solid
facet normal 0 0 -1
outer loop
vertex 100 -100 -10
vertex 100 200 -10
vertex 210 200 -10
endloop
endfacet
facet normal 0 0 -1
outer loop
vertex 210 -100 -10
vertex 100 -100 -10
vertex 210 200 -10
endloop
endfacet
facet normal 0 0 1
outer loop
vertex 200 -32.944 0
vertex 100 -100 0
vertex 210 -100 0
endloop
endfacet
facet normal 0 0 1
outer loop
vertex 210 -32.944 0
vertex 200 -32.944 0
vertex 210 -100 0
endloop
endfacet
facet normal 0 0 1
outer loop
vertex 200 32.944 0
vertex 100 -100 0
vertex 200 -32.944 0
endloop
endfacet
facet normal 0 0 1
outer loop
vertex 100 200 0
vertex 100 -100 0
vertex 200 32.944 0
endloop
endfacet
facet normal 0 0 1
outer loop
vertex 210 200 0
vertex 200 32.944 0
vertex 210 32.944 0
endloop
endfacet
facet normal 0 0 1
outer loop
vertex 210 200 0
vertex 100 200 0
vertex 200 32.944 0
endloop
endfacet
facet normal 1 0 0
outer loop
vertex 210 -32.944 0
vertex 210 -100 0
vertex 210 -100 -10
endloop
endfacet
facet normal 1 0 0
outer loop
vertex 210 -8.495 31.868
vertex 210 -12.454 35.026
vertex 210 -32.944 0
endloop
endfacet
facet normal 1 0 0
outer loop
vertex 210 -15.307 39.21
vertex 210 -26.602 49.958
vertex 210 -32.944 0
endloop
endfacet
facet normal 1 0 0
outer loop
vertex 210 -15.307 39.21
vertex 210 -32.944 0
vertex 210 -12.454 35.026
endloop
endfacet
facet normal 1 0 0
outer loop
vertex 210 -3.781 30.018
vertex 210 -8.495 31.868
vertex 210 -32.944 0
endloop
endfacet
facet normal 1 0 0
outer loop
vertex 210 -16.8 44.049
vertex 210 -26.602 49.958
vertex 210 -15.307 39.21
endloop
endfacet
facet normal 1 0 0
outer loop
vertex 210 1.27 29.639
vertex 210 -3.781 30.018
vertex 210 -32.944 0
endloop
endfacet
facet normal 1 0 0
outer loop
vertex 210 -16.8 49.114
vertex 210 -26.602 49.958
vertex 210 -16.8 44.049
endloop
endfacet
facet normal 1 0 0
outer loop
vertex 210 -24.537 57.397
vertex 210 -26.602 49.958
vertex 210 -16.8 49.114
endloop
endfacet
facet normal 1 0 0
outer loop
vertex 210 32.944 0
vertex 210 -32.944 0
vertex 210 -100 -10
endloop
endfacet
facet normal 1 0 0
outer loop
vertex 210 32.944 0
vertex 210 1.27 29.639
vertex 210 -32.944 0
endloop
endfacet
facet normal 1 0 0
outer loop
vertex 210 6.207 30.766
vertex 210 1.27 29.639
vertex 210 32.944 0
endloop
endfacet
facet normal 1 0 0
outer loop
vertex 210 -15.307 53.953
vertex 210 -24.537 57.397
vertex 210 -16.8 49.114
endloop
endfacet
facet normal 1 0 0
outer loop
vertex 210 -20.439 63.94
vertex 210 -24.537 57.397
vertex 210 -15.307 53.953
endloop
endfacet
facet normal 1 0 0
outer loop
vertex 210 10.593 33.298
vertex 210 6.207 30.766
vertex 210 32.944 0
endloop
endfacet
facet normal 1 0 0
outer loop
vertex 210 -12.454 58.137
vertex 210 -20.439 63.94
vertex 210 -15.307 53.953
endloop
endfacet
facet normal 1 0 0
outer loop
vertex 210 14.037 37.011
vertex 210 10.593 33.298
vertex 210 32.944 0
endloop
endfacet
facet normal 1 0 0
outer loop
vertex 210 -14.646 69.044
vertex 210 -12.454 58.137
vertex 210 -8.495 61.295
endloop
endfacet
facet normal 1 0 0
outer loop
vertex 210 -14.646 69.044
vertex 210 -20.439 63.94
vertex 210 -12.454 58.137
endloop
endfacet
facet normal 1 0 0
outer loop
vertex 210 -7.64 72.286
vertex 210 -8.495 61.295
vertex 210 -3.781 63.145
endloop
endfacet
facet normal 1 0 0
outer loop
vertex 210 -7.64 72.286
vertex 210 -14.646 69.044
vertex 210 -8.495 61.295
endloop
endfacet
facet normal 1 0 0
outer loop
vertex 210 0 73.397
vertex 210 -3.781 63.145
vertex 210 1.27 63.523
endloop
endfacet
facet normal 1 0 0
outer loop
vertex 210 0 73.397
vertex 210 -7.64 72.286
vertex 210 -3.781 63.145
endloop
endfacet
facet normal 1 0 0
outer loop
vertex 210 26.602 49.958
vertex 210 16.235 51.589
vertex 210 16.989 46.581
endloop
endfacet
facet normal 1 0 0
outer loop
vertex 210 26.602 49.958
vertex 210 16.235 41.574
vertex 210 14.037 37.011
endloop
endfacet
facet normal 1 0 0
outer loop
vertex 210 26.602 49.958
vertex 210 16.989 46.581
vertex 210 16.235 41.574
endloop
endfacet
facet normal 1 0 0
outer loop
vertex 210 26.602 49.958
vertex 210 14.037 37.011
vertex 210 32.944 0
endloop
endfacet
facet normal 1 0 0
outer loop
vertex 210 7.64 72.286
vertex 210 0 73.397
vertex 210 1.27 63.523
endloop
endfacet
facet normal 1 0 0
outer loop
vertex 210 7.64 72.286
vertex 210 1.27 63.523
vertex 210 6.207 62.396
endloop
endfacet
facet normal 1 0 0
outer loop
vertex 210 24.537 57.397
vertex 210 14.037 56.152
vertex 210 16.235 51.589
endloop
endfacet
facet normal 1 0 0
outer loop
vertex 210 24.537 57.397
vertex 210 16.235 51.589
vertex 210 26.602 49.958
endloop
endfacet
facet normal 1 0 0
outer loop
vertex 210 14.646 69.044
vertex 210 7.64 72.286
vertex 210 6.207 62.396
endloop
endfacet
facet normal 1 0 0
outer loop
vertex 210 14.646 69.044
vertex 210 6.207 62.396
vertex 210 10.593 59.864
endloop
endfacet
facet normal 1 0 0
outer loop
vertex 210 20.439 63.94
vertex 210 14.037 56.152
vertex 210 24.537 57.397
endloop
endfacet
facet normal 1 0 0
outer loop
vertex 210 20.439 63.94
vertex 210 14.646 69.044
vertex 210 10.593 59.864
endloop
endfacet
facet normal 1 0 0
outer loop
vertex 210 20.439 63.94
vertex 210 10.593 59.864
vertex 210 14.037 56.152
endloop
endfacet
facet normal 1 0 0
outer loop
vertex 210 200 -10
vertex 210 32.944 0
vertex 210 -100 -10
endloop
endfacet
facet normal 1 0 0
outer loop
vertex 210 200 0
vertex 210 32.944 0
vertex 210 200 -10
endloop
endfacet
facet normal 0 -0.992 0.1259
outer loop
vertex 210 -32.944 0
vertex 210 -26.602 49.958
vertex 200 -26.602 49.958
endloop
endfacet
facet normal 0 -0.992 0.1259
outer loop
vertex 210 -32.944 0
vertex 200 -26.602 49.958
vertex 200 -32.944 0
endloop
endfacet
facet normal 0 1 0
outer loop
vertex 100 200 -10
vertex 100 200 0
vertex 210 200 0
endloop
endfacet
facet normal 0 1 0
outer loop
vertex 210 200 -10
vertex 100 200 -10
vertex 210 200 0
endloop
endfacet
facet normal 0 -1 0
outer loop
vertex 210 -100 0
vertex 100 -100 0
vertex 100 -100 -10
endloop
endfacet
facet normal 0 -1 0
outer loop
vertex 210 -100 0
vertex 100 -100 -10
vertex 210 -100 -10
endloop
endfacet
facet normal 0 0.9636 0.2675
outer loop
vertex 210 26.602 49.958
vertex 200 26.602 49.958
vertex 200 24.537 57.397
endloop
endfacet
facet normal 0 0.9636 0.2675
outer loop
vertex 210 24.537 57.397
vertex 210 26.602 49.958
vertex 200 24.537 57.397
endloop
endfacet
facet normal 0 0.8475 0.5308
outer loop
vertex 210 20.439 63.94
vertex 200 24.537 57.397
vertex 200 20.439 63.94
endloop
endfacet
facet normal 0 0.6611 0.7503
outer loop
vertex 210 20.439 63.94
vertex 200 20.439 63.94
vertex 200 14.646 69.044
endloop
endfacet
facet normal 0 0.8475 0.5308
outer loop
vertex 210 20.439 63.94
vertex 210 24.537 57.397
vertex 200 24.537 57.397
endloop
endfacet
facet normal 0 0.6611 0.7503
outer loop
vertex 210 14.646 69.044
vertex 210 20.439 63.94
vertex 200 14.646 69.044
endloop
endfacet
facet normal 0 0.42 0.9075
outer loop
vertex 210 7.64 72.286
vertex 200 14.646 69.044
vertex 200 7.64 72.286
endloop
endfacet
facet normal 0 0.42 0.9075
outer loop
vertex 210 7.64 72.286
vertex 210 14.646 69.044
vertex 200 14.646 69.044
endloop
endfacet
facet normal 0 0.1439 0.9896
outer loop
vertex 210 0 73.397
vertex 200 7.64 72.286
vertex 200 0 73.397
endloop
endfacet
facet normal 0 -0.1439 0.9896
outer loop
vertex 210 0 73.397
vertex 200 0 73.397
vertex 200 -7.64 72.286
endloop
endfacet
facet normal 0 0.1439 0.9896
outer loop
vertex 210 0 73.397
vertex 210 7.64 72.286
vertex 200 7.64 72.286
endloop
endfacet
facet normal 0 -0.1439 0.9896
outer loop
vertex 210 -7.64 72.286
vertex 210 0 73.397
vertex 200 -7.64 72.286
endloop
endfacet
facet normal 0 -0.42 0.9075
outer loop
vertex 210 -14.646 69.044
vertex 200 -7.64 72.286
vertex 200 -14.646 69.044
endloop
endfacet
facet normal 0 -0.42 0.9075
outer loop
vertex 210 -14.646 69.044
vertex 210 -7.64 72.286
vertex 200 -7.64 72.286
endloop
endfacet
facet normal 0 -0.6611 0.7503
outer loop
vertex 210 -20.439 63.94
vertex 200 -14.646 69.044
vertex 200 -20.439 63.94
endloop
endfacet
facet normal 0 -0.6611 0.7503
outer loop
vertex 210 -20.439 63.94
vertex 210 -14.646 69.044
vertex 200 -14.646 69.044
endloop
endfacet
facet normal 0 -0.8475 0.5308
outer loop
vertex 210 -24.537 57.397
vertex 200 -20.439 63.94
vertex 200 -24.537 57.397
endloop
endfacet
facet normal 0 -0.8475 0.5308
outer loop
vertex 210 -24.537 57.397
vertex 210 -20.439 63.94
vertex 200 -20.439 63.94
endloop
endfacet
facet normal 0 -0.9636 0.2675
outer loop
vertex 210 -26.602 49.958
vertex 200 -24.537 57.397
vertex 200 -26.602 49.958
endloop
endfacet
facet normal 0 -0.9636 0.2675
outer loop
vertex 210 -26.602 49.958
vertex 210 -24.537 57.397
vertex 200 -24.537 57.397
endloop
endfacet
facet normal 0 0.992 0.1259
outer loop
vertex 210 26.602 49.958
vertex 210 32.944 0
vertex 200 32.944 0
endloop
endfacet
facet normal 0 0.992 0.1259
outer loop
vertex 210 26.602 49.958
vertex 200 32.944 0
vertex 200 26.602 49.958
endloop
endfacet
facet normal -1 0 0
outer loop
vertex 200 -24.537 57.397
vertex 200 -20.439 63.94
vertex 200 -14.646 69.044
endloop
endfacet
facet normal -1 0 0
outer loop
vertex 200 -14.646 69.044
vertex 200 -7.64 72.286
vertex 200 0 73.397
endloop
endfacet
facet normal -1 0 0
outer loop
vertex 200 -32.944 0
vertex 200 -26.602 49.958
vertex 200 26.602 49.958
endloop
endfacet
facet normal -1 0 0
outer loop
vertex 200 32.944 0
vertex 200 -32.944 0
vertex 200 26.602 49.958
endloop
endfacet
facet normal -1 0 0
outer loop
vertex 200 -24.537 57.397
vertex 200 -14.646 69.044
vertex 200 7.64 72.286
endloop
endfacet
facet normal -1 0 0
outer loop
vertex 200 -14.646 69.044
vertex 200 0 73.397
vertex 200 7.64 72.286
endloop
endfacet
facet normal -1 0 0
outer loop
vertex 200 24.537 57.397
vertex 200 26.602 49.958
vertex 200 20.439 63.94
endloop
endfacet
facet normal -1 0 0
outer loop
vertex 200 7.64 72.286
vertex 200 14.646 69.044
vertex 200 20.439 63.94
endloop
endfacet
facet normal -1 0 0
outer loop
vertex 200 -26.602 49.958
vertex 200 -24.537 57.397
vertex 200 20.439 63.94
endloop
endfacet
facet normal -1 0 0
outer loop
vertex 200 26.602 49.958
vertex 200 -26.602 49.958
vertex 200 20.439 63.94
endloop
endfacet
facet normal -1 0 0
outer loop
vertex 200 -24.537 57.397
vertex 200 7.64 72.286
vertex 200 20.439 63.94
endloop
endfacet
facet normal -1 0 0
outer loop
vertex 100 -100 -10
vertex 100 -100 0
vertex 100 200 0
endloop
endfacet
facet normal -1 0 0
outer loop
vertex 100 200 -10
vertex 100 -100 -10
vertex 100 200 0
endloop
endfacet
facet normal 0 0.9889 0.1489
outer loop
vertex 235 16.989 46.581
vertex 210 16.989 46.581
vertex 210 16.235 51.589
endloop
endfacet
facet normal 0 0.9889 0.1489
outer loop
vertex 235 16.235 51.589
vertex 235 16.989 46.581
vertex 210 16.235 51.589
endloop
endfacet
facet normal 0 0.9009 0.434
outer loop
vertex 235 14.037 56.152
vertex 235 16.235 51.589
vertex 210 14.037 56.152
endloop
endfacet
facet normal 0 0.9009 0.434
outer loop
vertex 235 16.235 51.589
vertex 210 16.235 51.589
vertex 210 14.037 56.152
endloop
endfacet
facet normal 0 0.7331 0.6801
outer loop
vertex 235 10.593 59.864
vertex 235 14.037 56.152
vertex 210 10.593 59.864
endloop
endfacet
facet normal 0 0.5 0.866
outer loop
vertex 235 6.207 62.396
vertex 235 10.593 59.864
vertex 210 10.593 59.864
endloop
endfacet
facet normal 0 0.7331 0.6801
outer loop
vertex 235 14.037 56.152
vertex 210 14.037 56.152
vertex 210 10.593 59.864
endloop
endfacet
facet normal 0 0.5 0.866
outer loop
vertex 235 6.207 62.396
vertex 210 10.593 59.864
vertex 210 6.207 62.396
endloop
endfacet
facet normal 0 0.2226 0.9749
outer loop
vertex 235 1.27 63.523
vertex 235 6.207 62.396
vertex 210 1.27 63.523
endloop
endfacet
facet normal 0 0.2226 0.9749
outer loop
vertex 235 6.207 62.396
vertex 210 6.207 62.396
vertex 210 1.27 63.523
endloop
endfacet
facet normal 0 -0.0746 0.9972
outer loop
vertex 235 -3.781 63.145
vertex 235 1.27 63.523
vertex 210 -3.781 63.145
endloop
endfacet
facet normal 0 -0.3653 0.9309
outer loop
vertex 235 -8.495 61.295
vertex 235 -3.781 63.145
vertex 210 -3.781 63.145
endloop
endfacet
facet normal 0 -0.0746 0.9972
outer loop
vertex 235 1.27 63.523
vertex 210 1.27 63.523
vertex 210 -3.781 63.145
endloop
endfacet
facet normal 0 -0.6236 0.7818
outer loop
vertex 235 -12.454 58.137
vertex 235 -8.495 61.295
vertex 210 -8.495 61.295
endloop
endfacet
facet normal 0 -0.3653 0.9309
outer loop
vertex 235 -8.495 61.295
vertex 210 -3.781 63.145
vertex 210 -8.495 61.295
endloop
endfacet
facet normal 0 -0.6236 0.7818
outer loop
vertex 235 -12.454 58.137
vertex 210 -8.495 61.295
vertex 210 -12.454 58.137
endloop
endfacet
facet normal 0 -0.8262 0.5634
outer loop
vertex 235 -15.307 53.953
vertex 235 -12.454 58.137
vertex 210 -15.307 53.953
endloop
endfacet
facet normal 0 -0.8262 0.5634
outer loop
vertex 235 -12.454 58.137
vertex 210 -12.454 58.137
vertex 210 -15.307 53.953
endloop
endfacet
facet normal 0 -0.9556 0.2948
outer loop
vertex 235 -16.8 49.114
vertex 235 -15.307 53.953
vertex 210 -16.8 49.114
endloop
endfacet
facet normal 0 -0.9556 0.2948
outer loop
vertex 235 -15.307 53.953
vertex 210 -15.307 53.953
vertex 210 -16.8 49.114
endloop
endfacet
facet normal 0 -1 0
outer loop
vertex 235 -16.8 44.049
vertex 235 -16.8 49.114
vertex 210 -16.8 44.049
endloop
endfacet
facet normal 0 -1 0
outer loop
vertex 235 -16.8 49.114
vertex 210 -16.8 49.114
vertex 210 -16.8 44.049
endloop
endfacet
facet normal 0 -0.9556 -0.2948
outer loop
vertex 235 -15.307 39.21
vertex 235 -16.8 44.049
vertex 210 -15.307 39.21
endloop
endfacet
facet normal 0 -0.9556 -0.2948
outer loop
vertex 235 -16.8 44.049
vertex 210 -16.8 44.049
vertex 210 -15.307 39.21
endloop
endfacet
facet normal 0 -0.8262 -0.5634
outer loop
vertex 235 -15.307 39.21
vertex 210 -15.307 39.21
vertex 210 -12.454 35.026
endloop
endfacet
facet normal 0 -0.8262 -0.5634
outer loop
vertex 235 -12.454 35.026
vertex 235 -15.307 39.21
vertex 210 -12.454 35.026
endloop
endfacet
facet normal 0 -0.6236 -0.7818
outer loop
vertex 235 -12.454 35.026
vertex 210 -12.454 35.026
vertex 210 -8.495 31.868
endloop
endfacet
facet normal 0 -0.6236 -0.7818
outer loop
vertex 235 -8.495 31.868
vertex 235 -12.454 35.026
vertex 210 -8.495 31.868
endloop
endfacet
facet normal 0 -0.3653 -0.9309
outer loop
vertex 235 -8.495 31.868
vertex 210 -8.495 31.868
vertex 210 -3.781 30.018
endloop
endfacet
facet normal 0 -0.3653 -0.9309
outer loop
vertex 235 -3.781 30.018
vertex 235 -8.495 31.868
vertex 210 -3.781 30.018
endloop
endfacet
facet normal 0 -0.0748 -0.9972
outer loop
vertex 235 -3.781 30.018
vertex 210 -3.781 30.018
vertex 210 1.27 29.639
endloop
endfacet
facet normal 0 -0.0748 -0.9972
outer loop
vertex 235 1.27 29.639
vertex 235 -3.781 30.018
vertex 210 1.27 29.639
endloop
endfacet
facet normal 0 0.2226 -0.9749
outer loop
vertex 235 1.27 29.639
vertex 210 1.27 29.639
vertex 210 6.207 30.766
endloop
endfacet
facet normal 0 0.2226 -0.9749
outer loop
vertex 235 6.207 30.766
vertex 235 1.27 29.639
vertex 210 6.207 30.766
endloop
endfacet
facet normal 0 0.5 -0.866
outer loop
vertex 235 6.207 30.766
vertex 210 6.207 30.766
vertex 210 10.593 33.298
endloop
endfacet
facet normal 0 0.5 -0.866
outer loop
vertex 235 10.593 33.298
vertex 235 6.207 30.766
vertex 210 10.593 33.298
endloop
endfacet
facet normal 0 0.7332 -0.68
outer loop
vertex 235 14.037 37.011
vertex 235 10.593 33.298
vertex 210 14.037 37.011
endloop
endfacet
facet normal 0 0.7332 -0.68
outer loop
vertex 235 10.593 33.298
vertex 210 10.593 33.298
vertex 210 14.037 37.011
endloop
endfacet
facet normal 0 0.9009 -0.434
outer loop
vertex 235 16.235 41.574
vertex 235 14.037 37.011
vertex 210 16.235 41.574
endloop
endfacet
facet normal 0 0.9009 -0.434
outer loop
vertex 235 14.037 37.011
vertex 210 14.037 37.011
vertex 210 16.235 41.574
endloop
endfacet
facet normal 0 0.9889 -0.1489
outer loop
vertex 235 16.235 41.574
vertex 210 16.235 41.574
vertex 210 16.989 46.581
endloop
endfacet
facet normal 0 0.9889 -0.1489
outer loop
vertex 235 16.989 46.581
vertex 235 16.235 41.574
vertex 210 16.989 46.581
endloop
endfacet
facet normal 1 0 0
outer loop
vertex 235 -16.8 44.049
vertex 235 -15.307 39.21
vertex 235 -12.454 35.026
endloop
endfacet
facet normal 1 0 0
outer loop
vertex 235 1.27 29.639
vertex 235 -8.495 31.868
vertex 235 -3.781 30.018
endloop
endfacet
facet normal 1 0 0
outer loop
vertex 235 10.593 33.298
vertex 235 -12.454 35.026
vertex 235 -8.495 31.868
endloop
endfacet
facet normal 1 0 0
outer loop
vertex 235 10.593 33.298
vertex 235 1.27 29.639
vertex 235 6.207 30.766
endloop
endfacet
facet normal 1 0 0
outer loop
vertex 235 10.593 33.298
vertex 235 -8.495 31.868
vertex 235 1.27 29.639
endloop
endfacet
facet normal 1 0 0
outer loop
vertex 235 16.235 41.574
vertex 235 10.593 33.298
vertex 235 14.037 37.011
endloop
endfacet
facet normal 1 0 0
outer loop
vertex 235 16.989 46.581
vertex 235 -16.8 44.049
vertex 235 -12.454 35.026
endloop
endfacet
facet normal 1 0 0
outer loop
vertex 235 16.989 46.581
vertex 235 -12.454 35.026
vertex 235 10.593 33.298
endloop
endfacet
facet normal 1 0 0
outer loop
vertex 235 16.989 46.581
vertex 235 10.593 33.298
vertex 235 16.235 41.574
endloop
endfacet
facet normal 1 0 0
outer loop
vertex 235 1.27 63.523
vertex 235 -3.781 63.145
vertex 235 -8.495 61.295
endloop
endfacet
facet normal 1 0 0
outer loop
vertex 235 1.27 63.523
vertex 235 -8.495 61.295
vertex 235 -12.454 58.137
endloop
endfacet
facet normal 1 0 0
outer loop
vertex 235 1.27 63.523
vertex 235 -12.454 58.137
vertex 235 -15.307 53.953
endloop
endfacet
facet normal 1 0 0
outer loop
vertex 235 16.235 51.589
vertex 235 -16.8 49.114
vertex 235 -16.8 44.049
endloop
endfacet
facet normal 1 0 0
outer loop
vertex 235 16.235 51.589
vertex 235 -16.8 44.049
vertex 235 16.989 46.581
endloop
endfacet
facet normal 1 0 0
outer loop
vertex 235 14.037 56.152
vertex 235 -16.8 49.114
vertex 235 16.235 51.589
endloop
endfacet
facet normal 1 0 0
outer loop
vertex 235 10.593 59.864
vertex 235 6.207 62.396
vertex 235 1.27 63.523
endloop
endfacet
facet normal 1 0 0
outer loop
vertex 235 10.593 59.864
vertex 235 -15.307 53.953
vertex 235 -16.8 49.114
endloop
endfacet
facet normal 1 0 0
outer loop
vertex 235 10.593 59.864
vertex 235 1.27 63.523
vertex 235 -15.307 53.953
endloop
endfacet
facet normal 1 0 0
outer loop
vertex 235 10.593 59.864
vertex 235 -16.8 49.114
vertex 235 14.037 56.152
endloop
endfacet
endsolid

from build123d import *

# Parameters (mm, degrees)
F4_W     = 110
F4_H     = 300
F5_DEPTH = 9.9999997765
F0_R     = 16.989496858
F1_DEPTH = 10
F2_DEPTH = 25


with BuildPart() as f5:
    # F4 (on Top) → F5 (new body)
    with BuildSketch(Plane.XY):
        with Locations((155, 50)):
            Rectangle(F4_W, F4_H)
    extrude(amount=-F5_DEPTH)

    # F0 (on face) → F1 (join)
    with BuildSketch(Plane.YZ.offset(210)):
        with BuildLine():
            ThreePointArc((26.601998421, 49.9582877529), (0, 73.3968899806), (-26.601998421, 49.9582877529))
            Line((-26.601998421, 49.9582877529), (-32.9437274149, 0))
            Line((-32.9437274149, 0), (32.9437274149, 0))
            Line((32.9437274149, 0), (26.601998421, 49.9582877529))
        make_face()
        with Locations((0, 46.5814173222)):
            Circle(F0_R, mode=Mode.SUBTRACT)
        with Locations((0, 46.5814173222)):
            Circle(F0_R)
    extrude(amount=-F1_DEPTH)

    # F0 (on face) → F2 (join)
    with BuildSketch(Plane.YZ.offset(210)):
        with Locations((0, 46.5814173222)):
            Circle(F0_R)
    extrude(amount=F2_DEPTH)


solid = f5.part
